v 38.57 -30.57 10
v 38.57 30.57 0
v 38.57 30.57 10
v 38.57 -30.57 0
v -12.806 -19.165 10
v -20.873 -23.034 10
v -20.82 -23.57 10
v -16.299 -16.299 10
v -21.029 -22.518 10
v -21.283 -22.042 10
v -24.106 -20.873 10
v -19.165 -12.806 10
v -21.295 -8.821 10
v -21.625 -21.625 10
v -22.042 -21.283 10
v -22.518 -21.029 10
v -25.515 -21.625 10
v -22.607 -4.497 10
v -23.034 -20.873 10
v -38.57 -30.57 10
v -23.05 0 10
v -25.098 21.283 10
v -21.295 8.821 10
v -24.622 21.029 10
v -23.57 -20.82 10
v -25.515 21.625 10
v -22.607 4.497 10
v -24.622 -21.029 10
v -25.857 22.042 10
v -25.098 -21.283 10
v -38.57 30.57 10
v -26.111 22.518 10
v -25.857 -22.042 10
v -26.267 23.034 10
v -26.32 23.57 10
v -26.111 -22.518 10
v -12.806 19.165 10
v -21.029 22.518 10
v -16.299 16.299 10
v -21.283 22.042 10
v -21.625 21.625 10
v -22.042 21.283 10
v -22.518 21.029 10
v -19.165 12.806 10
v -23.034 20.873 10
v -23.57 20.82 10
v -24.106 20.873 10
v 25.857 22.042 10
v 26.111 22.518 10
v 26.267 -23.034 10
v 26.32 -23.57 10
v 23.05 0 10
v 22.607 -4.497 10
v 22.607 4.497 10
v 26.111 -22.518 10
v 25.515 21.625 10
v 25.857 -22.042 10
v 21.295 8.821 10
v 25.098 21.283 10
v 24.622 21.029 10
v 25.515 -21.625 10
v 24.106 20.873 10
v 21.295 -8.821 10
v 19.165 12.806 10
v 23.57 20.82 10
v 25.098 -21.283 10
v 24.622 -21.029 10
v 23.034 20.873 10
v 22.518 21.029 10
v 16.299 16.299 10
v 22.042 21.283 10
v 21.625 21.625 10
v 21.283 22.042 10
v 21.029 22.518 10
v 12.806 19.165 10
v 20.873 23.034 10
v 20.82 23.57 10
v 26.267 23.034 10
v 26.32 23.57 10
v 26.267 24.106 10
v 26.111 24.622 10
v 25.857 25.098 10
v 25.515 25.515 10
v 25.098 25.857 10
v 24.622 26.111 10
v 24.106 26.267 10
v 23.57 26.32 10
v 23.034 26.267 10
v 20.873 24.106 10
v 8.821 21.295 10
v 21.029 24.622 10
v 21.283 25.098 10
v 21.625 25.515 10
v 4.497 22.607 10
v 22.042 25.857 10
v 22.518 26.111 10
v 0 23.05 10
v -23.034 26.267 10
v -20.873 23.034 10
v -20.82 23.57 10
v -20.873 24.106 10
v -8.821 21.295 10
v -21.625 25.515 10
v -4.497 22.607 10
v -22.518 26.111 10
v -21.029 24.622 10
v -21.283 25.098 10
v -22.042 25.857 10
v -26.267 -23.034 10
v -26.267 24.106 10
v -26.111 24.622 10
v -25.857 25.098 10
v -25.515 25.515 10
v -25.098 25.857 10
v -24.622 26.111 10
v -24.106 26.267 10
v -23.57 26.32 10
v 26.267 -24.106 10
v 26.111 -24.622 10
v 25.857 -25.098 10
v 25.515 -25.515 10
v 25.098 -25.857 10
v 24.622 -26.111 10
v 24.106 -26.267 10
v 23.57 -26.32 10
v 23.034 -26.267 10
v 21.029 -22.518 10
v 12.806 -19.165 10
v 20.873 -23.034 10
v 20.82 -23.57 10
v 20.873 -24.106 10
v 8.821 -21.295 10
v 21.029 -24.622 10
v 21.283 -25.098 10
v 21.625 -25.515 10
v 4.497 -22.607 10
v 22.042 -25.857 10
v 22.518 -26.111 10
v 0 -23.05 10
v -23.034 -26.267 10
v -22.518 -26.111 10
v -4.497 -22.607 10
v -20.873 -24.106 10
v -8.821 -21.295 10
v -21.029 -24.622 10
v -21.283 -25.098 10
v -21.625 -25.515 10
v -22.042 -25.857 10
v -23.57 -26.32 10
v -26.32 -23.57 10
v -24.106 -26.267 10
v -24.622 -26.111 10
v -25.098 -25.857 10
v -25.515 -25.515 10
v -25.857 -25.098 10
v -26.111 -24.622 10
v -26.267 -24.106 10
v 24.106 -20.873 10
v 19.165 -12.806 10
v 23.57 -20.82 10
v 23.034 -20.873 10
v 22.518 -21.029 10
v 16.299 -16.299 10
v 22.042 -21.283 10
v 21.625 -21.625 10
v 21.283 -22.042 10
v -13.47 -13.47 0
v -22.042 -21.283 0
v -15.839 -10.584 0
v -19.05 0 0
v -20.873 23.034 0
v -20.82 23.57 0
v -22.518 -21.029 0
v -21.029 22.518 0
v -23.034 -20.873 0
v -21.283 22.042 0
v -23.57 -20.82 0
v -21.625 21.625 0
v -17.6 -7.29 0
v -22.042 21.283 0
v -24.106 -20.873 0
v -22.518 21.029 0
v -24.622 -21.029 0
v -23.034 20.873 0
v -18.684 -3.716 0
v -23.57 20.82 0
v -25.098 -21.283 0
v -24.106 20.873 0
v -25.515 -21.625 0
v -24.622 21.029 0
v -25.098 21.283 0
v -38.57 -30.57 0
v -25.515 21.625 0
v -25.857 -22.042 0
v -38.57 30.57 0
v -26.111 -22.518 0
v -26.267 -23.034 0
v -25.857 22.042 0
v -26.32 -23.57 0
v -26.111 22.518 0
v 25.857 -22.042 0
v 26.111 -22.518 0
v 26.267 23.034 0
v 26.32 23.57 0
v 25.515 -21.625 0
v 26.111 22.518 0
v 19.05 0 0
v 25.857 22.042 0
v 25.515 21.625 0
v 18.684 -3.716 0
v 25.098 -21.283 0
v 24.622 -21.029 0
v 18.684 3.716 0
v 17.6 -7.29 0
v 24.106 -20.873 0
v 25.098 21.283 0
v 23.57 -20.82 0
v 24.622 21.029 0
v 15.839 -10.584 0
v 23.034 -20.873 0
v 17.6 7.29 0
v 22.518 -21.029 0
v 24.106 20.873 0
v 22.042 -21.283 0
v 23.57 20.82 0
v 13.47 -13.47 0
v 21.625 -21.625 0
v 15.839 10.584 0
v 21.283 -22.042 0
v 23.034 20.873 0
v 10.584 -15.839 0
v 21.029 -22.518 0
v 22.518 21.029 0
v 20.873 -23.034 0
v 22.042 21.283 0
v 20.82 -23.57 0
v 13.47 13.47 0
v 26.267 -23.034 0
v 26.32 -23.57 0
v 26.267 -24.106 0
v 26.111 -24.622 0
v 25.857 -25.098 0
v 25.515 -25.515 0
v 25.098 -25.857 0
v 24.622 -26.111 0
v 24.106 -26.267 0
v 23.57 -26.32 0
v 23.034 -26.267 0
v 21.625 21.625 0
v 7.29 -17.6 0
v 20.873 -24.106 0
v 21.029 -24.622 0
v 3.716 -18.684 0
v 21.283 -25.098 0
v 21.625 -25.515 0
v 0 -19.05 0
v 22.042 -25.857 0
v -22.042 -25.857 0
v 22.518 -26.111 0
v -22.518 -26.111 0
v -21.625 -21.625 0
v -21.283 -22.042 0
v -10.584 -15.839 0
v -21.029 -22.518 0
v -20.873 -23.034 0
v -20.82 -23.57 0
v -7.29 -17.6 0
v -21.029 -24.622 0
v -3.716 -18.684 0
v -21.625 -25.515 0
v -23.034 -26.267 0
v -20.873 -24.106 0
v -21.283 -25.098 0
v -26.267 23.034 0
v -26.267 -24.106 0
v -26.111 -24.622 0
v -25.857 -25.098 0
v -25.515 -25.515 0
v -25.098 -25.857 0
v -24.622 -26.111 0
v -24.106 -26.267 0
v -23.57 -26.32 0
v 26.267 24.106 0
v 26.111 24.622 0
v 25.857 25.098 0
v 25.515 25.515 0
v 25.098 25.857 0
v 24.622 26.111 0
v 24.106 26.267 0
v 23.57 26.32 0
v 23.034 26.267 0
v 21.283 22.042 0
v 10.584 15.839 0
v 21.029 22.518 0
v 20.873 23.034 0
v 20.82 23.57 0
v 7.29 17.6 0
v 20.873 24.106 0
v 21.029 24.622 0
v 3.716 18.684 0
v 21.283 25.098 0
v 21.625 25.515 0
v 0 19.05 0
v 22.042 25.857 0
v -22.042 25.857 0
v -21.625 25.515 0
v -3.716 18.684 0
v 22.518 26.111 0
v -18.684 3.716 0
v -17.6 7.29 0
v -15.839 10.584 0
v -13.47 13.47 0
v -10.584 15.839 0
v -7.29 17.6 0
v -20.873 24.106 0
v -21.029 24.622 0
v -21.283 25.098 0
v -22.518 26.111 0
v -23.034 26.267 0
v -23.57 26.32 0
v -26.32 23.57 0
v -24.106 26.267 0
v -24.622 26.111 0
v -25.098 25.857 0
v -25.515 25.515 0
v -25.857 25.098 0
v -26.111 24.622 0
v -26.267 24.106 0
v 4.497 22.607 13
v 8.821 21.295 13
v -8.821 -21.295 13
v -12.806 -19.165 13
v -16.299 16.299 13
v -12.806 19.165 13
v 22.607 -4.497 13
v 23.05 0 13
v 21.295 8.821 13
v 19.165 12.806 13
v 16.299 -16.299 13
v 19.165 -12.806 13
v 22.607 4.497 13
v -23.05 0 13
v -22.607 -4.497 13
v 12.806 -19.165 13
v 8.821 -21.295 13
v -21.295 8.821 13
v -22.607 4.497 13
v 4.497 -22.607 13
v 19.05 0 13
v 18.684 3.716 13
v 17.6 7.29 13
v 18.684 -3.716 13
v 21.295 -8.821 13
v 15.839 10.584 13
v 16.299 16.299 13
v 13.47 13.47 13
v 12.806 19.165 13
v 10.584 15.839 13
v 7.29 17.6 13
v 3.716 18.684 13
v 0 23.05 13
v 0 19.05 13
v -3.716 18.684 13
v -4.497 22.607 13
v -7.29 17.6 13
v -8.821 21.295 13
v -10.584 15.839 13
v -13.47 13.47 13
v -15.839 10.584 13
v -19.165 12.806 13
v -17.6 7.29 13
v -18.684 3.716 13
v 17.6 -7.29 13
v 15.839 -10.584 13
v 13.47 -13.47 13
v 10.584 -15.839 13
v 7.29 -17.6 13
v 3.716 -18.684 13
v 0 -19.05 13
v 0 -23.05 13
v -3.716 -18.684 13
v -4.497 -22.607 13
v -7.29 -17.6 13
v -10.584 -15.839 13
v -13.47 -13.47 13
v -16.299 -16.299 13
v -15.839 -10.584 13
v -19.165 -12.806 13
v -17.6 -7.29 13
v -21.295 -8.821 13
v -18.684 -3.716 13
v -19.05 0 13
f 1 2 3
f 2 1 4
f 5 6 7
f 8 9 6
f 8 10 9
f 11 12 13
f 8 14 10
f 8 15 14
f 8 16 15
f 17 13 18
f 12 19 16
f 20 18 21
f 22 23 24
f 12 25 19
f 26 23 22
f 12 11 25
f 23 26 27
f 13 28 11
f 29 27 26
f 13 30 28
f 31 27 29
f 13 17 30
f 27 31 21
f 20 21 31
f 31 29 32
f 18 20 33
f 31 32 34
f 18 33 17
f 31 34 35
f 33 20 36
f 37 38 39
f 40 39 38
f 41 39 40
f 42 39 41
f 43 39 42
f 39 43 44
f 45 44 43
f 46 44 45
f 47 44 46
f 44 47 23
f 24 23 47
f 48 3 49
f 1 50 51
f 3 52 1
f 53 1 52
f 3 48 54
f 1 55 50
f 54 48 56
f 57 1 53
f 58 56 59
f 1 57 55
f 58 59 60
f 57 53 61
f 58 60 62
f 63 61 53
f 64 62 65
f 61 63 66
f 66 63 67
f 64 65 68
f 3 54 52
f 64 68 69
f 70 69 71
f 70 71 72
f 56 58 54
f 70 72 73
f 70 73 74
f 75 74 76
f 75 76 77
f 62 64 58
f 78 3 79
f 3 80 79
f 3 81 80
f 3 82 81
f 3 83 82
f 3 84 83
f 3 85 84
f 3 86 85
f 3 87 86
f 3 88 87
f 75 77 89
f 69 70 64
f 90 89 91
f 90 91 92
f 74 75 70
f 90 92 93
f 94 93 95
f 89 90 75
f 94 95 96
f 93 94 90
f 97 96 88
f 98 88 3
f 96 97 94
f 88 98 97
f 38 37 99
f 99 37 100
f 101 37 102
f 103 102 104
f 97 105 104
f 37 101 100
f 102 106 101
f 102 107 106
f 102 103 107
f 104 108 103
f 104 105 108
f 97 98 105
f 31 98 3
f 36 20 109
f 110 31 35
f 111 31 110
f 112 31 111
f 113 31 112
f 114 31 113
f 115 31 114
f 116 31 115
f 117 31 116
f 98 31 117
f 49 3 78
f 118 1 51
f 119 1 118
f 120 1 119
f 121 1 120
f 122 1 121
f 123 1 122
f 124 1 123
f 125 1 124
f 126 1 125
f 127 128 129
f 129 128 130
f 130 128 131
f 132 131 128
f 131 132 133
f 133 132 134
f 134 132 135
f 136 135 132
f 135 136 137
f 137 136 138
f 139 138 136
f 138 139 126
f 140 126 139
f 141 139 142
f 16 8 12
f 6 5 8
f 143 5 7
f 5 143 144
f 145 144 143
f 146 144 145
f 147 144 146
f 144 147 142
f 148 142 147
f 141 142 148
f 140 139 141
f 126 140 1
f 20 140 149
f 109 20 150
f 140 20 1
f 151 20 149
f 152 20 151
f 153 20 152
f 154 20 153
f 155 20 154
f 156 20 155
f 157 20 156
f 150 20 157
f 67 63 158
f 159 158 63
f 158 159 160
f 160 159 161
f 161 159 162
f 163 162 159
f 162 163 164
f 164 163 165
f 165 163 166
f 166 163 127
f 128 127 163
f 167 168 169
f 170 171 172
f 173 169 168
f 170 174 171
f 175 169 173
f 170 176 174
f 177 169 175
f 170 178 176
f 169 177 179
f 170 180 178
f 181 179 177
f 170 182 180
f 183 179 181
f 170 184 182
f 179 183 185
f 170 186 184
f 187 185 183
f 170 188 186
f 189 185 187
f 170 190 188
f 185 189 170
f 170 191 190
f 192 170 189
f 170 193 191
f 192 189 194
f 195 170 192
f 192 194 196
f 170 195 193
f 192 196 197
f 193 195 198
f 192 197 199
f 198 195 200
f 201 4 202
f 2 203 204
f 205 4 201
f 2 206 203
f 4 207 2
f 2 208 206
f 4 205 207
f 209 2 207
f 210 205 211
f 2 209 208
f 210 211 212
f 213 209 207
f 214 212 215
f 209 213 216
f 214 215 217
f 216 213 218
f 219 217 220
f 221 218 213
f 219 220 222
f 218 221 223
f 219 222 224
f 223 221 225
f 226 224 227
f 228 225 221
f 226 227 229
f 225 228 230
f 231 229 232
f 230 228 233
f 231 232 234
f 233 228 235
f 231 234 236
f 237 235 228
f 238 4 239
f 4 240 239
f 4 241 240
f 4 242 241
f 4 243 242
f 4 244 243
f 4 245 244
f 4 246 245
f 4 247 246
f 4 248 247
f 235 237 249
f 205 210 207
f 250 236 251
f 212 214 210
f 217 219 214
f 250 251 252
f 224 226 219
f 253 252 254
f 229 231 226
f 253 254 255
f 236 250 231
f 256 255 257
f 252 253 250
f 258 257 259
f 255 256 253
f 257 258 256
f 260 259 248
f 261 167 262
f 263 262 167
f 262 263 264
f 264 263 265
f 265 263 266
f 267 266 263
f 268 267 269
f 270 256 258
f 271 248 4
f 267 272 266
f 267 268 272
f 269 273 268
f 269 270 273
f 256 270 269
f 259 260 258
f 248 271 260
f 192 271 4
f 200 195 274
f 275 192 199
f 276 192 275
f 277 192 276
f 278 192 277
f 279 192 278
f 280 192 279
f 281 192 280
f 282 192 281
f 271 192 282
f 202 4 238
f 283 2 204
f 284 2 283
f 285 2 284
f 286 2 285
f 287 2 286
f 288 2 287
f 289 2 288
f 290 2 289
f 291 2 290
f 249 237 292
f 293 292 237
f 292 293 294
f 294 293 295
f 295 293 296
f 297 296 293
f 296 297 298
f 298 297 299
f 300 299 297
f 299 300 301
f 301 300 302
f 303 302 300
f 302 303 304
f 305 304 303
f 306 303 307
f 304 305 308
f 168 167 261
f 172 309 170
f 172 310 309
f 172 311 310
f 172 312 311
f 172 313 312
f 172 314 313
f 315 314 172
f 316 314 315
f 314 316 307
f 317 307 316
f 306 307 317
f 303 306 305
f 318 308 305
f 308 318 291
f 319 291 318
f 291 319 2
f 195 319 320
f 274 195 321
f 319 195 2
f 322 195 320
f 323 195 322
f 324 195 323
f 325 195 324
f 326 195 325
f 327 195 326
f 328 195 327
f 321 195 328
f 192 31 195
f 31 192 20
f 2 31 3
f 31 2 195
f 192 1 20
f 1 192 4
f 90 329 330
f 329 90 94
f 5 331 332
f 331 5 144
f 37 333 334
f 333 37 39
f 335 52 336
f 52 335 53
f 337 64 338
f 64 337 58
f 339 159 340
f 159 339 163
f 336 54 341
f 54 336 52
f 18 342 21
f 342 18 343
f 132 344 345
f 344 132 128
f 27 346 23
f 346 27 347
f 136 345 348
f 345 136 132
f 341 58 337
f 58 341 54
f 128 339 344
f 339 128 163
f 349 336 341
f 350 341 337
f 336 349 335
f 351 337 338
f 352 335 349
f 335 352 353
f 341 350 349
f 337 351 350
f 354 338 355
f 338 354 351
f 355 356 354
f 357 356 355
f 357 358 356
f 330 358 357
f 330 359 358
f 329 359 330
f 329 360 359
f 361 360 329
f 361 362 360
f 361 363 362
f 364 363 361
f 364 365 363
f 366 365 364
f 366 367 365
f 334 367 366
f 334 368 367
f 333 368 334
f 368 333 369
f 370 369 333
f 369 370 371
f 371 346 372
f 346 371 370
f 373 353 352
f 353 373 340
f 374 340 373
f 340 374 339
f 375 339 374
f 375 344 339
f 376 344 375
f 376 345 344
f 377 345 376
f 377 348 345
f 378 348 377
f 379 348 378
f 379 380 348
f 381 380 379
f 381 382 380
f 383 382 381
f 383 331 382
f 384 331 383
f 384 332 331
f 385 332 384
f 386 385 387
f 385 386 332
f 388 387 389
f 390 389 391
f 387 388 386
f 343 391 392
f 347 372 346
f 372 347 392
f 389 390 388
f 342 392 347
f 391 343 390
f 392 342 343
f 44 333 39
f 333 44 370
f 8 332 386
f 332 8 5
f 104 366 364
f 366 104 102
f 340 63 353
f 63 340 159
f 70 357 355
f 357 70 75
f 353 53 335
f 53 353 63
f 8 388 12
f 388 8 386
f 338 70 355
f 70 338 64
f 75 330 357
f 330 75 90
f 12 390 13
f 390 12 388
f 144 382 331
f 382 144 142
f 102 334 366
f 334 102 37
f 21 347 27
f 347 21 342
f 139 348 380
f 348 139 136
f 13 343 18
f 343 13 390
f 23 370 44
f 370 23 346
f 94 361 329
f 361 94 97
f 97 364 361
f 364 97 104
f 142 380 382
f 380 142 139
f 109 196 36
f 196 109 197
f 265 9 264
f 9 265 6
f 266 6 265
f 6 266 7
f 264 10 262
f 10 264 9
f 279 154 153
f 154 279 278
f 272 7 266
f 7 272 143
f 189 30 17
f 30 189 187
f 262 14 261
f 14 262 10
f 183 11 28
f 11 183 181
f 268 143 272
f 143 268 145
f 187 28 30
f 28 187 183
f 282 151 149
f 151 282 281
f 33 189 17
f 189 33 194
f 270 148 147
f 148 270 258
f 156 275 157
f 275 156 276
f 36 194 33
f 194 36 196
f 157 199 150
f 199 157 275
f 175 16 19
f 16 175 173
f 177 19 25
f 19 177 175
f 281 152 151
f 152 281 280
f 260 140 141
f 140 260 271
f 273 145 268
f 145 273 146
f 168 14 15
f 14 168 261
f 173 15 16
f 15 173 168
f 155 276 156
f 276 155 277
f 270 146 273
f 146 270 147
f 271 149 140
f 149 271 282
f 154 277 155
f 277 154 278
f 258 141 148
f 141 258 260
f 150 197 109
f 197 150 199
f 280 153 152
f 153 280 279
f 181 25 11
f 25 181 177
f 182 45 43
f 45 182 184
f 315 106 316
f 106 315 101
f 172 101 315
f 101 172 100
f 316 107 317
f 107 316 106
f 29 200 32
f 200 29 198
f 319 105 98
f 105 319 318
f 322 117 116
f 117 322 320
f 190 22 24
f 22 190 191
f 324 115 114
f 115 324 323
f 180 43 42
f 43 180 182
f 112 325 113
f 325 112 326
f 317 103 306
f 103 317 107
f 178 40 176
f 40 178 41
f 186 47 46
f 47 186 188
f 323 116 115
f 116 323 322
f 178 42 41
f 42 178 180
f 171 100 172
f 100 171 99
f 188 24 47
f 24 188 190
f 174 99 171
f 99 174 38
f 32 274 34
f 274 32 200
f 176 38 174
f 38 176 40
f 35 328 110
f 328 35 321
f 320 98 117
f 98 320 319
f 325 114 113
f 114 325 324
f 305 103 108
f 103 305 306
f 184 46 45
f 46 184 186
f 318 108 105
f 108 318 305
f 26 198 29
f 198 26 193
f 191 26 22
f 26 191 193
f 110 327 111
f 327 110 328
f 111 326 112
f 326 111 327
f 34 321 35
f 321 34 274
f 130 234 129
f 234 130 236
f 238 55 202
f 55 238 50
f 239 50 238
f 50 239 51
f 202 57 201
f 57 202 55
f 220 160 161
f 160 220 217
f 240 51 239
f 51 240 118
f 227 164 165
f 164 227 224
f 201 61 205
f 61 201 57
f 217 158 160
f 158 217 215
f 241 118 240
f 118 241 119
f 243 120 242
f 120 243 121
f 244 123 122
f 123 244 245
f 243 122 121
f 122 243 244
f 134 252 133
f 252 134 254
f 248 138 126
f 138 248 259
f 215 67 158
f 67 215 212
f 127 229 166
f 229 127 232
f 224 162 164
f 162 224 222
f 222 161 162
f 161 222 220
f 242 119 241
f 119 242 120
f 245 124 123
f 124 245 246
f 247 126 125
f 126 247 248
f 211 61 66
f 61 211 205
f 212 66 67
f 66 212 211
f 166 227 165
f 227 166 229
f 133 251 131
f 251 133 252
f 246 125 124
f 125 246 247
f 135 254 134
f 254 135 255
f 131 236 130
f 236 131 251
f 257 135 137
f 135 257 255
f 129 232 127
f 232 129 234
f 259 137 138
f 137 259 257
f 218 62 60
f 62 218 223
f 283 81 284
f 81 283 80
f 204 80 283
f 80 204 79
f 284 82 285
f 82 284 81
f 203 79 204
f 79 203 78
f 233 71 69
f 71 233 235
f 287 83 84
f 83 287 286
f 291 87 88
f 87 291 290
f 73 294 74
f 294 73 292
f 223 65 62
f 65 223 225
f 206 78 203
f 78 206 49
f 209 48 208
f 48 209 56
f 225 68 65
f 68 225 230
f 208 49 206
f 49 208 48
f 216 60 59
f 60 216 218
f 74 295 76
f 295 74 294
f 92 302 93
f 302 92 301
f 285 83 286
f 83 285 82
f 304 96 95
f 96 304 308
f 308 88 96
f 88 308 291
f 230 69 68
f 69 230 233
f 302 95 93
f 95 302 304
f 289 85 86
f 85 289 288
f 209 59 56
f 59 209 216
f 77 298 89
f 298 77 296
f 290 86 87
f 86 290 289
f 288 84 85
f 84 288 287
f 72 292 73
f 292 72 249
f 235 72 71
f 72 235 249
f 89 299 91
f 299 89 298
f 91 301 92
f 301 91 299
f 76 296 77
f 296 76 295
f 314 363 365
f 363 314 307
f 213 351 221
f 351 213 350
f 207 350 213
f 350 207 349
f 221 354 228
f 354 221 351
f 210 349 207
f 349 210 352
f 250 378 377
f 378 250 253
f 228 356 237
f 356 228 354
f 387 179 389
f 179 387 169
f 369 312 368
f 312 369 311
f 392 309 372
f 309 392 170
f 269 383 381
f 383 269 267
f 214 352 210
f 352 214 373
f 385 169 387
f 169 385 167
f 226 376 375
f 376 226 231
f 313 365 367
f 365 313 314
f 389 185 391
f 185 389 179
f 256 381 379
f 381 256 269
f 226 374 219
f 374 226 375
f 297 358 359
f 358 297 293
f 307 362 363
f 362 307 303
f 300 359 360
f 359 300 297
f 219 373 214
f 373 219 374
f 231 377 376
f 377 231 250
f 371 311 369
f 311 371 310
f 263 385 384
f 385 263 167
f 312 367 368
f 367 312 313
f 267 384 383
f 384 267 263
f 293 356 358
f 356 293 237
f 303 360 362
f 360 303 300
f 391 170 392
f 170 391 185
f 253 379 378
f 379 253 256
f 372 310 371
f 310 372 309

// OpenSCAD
$fn = 32;

// ----------------------------------------------------------------------
// Motor mount plate: NEMA23, 77.14 x 61.14 x 13 mm
// ----------------------------------------------------------------------

// --- parameters (mm) ---
base_x = 77.14;           // plate length, X
base_y = 61.14;           // plate width, Y
thick = 10;               // plate thickness
bolt_pitch = 47.14;       // NEMA23 bolt spacing
motor_d = 5.5;            // NEMA23 screw clearance
boss_hole = 38.1;         // pilot boss bore
boss_d = 46.1;            // raised pilot ring
boss_h = 3;               // raised pilot ring height

module plate() {
  translate([-base_x / 2, -base_y / 2, 0]) cube([base_x, base_y, thick]);
}

module motor_holes() {
  for (sx = [-1, 1]) for (sy = [-1, 1])
    translate([sx * bolt_pitch / 2, sy * bolt_pitch / 2, -1])
      cylinder(h = thick + 2, d = motor_d);
}
module pilot_ring() {
  translate([0, 0, thick - 1]) cylinder(h = boss_h + 1, d = boss_d);
}

difference() {
  union() {
    plate();
    pilot_ring();
  }
  motor_holes();
  translate([0, 0, -1]) cylinder(h = thick + boss_h + 2, d = boss_hole);
}
